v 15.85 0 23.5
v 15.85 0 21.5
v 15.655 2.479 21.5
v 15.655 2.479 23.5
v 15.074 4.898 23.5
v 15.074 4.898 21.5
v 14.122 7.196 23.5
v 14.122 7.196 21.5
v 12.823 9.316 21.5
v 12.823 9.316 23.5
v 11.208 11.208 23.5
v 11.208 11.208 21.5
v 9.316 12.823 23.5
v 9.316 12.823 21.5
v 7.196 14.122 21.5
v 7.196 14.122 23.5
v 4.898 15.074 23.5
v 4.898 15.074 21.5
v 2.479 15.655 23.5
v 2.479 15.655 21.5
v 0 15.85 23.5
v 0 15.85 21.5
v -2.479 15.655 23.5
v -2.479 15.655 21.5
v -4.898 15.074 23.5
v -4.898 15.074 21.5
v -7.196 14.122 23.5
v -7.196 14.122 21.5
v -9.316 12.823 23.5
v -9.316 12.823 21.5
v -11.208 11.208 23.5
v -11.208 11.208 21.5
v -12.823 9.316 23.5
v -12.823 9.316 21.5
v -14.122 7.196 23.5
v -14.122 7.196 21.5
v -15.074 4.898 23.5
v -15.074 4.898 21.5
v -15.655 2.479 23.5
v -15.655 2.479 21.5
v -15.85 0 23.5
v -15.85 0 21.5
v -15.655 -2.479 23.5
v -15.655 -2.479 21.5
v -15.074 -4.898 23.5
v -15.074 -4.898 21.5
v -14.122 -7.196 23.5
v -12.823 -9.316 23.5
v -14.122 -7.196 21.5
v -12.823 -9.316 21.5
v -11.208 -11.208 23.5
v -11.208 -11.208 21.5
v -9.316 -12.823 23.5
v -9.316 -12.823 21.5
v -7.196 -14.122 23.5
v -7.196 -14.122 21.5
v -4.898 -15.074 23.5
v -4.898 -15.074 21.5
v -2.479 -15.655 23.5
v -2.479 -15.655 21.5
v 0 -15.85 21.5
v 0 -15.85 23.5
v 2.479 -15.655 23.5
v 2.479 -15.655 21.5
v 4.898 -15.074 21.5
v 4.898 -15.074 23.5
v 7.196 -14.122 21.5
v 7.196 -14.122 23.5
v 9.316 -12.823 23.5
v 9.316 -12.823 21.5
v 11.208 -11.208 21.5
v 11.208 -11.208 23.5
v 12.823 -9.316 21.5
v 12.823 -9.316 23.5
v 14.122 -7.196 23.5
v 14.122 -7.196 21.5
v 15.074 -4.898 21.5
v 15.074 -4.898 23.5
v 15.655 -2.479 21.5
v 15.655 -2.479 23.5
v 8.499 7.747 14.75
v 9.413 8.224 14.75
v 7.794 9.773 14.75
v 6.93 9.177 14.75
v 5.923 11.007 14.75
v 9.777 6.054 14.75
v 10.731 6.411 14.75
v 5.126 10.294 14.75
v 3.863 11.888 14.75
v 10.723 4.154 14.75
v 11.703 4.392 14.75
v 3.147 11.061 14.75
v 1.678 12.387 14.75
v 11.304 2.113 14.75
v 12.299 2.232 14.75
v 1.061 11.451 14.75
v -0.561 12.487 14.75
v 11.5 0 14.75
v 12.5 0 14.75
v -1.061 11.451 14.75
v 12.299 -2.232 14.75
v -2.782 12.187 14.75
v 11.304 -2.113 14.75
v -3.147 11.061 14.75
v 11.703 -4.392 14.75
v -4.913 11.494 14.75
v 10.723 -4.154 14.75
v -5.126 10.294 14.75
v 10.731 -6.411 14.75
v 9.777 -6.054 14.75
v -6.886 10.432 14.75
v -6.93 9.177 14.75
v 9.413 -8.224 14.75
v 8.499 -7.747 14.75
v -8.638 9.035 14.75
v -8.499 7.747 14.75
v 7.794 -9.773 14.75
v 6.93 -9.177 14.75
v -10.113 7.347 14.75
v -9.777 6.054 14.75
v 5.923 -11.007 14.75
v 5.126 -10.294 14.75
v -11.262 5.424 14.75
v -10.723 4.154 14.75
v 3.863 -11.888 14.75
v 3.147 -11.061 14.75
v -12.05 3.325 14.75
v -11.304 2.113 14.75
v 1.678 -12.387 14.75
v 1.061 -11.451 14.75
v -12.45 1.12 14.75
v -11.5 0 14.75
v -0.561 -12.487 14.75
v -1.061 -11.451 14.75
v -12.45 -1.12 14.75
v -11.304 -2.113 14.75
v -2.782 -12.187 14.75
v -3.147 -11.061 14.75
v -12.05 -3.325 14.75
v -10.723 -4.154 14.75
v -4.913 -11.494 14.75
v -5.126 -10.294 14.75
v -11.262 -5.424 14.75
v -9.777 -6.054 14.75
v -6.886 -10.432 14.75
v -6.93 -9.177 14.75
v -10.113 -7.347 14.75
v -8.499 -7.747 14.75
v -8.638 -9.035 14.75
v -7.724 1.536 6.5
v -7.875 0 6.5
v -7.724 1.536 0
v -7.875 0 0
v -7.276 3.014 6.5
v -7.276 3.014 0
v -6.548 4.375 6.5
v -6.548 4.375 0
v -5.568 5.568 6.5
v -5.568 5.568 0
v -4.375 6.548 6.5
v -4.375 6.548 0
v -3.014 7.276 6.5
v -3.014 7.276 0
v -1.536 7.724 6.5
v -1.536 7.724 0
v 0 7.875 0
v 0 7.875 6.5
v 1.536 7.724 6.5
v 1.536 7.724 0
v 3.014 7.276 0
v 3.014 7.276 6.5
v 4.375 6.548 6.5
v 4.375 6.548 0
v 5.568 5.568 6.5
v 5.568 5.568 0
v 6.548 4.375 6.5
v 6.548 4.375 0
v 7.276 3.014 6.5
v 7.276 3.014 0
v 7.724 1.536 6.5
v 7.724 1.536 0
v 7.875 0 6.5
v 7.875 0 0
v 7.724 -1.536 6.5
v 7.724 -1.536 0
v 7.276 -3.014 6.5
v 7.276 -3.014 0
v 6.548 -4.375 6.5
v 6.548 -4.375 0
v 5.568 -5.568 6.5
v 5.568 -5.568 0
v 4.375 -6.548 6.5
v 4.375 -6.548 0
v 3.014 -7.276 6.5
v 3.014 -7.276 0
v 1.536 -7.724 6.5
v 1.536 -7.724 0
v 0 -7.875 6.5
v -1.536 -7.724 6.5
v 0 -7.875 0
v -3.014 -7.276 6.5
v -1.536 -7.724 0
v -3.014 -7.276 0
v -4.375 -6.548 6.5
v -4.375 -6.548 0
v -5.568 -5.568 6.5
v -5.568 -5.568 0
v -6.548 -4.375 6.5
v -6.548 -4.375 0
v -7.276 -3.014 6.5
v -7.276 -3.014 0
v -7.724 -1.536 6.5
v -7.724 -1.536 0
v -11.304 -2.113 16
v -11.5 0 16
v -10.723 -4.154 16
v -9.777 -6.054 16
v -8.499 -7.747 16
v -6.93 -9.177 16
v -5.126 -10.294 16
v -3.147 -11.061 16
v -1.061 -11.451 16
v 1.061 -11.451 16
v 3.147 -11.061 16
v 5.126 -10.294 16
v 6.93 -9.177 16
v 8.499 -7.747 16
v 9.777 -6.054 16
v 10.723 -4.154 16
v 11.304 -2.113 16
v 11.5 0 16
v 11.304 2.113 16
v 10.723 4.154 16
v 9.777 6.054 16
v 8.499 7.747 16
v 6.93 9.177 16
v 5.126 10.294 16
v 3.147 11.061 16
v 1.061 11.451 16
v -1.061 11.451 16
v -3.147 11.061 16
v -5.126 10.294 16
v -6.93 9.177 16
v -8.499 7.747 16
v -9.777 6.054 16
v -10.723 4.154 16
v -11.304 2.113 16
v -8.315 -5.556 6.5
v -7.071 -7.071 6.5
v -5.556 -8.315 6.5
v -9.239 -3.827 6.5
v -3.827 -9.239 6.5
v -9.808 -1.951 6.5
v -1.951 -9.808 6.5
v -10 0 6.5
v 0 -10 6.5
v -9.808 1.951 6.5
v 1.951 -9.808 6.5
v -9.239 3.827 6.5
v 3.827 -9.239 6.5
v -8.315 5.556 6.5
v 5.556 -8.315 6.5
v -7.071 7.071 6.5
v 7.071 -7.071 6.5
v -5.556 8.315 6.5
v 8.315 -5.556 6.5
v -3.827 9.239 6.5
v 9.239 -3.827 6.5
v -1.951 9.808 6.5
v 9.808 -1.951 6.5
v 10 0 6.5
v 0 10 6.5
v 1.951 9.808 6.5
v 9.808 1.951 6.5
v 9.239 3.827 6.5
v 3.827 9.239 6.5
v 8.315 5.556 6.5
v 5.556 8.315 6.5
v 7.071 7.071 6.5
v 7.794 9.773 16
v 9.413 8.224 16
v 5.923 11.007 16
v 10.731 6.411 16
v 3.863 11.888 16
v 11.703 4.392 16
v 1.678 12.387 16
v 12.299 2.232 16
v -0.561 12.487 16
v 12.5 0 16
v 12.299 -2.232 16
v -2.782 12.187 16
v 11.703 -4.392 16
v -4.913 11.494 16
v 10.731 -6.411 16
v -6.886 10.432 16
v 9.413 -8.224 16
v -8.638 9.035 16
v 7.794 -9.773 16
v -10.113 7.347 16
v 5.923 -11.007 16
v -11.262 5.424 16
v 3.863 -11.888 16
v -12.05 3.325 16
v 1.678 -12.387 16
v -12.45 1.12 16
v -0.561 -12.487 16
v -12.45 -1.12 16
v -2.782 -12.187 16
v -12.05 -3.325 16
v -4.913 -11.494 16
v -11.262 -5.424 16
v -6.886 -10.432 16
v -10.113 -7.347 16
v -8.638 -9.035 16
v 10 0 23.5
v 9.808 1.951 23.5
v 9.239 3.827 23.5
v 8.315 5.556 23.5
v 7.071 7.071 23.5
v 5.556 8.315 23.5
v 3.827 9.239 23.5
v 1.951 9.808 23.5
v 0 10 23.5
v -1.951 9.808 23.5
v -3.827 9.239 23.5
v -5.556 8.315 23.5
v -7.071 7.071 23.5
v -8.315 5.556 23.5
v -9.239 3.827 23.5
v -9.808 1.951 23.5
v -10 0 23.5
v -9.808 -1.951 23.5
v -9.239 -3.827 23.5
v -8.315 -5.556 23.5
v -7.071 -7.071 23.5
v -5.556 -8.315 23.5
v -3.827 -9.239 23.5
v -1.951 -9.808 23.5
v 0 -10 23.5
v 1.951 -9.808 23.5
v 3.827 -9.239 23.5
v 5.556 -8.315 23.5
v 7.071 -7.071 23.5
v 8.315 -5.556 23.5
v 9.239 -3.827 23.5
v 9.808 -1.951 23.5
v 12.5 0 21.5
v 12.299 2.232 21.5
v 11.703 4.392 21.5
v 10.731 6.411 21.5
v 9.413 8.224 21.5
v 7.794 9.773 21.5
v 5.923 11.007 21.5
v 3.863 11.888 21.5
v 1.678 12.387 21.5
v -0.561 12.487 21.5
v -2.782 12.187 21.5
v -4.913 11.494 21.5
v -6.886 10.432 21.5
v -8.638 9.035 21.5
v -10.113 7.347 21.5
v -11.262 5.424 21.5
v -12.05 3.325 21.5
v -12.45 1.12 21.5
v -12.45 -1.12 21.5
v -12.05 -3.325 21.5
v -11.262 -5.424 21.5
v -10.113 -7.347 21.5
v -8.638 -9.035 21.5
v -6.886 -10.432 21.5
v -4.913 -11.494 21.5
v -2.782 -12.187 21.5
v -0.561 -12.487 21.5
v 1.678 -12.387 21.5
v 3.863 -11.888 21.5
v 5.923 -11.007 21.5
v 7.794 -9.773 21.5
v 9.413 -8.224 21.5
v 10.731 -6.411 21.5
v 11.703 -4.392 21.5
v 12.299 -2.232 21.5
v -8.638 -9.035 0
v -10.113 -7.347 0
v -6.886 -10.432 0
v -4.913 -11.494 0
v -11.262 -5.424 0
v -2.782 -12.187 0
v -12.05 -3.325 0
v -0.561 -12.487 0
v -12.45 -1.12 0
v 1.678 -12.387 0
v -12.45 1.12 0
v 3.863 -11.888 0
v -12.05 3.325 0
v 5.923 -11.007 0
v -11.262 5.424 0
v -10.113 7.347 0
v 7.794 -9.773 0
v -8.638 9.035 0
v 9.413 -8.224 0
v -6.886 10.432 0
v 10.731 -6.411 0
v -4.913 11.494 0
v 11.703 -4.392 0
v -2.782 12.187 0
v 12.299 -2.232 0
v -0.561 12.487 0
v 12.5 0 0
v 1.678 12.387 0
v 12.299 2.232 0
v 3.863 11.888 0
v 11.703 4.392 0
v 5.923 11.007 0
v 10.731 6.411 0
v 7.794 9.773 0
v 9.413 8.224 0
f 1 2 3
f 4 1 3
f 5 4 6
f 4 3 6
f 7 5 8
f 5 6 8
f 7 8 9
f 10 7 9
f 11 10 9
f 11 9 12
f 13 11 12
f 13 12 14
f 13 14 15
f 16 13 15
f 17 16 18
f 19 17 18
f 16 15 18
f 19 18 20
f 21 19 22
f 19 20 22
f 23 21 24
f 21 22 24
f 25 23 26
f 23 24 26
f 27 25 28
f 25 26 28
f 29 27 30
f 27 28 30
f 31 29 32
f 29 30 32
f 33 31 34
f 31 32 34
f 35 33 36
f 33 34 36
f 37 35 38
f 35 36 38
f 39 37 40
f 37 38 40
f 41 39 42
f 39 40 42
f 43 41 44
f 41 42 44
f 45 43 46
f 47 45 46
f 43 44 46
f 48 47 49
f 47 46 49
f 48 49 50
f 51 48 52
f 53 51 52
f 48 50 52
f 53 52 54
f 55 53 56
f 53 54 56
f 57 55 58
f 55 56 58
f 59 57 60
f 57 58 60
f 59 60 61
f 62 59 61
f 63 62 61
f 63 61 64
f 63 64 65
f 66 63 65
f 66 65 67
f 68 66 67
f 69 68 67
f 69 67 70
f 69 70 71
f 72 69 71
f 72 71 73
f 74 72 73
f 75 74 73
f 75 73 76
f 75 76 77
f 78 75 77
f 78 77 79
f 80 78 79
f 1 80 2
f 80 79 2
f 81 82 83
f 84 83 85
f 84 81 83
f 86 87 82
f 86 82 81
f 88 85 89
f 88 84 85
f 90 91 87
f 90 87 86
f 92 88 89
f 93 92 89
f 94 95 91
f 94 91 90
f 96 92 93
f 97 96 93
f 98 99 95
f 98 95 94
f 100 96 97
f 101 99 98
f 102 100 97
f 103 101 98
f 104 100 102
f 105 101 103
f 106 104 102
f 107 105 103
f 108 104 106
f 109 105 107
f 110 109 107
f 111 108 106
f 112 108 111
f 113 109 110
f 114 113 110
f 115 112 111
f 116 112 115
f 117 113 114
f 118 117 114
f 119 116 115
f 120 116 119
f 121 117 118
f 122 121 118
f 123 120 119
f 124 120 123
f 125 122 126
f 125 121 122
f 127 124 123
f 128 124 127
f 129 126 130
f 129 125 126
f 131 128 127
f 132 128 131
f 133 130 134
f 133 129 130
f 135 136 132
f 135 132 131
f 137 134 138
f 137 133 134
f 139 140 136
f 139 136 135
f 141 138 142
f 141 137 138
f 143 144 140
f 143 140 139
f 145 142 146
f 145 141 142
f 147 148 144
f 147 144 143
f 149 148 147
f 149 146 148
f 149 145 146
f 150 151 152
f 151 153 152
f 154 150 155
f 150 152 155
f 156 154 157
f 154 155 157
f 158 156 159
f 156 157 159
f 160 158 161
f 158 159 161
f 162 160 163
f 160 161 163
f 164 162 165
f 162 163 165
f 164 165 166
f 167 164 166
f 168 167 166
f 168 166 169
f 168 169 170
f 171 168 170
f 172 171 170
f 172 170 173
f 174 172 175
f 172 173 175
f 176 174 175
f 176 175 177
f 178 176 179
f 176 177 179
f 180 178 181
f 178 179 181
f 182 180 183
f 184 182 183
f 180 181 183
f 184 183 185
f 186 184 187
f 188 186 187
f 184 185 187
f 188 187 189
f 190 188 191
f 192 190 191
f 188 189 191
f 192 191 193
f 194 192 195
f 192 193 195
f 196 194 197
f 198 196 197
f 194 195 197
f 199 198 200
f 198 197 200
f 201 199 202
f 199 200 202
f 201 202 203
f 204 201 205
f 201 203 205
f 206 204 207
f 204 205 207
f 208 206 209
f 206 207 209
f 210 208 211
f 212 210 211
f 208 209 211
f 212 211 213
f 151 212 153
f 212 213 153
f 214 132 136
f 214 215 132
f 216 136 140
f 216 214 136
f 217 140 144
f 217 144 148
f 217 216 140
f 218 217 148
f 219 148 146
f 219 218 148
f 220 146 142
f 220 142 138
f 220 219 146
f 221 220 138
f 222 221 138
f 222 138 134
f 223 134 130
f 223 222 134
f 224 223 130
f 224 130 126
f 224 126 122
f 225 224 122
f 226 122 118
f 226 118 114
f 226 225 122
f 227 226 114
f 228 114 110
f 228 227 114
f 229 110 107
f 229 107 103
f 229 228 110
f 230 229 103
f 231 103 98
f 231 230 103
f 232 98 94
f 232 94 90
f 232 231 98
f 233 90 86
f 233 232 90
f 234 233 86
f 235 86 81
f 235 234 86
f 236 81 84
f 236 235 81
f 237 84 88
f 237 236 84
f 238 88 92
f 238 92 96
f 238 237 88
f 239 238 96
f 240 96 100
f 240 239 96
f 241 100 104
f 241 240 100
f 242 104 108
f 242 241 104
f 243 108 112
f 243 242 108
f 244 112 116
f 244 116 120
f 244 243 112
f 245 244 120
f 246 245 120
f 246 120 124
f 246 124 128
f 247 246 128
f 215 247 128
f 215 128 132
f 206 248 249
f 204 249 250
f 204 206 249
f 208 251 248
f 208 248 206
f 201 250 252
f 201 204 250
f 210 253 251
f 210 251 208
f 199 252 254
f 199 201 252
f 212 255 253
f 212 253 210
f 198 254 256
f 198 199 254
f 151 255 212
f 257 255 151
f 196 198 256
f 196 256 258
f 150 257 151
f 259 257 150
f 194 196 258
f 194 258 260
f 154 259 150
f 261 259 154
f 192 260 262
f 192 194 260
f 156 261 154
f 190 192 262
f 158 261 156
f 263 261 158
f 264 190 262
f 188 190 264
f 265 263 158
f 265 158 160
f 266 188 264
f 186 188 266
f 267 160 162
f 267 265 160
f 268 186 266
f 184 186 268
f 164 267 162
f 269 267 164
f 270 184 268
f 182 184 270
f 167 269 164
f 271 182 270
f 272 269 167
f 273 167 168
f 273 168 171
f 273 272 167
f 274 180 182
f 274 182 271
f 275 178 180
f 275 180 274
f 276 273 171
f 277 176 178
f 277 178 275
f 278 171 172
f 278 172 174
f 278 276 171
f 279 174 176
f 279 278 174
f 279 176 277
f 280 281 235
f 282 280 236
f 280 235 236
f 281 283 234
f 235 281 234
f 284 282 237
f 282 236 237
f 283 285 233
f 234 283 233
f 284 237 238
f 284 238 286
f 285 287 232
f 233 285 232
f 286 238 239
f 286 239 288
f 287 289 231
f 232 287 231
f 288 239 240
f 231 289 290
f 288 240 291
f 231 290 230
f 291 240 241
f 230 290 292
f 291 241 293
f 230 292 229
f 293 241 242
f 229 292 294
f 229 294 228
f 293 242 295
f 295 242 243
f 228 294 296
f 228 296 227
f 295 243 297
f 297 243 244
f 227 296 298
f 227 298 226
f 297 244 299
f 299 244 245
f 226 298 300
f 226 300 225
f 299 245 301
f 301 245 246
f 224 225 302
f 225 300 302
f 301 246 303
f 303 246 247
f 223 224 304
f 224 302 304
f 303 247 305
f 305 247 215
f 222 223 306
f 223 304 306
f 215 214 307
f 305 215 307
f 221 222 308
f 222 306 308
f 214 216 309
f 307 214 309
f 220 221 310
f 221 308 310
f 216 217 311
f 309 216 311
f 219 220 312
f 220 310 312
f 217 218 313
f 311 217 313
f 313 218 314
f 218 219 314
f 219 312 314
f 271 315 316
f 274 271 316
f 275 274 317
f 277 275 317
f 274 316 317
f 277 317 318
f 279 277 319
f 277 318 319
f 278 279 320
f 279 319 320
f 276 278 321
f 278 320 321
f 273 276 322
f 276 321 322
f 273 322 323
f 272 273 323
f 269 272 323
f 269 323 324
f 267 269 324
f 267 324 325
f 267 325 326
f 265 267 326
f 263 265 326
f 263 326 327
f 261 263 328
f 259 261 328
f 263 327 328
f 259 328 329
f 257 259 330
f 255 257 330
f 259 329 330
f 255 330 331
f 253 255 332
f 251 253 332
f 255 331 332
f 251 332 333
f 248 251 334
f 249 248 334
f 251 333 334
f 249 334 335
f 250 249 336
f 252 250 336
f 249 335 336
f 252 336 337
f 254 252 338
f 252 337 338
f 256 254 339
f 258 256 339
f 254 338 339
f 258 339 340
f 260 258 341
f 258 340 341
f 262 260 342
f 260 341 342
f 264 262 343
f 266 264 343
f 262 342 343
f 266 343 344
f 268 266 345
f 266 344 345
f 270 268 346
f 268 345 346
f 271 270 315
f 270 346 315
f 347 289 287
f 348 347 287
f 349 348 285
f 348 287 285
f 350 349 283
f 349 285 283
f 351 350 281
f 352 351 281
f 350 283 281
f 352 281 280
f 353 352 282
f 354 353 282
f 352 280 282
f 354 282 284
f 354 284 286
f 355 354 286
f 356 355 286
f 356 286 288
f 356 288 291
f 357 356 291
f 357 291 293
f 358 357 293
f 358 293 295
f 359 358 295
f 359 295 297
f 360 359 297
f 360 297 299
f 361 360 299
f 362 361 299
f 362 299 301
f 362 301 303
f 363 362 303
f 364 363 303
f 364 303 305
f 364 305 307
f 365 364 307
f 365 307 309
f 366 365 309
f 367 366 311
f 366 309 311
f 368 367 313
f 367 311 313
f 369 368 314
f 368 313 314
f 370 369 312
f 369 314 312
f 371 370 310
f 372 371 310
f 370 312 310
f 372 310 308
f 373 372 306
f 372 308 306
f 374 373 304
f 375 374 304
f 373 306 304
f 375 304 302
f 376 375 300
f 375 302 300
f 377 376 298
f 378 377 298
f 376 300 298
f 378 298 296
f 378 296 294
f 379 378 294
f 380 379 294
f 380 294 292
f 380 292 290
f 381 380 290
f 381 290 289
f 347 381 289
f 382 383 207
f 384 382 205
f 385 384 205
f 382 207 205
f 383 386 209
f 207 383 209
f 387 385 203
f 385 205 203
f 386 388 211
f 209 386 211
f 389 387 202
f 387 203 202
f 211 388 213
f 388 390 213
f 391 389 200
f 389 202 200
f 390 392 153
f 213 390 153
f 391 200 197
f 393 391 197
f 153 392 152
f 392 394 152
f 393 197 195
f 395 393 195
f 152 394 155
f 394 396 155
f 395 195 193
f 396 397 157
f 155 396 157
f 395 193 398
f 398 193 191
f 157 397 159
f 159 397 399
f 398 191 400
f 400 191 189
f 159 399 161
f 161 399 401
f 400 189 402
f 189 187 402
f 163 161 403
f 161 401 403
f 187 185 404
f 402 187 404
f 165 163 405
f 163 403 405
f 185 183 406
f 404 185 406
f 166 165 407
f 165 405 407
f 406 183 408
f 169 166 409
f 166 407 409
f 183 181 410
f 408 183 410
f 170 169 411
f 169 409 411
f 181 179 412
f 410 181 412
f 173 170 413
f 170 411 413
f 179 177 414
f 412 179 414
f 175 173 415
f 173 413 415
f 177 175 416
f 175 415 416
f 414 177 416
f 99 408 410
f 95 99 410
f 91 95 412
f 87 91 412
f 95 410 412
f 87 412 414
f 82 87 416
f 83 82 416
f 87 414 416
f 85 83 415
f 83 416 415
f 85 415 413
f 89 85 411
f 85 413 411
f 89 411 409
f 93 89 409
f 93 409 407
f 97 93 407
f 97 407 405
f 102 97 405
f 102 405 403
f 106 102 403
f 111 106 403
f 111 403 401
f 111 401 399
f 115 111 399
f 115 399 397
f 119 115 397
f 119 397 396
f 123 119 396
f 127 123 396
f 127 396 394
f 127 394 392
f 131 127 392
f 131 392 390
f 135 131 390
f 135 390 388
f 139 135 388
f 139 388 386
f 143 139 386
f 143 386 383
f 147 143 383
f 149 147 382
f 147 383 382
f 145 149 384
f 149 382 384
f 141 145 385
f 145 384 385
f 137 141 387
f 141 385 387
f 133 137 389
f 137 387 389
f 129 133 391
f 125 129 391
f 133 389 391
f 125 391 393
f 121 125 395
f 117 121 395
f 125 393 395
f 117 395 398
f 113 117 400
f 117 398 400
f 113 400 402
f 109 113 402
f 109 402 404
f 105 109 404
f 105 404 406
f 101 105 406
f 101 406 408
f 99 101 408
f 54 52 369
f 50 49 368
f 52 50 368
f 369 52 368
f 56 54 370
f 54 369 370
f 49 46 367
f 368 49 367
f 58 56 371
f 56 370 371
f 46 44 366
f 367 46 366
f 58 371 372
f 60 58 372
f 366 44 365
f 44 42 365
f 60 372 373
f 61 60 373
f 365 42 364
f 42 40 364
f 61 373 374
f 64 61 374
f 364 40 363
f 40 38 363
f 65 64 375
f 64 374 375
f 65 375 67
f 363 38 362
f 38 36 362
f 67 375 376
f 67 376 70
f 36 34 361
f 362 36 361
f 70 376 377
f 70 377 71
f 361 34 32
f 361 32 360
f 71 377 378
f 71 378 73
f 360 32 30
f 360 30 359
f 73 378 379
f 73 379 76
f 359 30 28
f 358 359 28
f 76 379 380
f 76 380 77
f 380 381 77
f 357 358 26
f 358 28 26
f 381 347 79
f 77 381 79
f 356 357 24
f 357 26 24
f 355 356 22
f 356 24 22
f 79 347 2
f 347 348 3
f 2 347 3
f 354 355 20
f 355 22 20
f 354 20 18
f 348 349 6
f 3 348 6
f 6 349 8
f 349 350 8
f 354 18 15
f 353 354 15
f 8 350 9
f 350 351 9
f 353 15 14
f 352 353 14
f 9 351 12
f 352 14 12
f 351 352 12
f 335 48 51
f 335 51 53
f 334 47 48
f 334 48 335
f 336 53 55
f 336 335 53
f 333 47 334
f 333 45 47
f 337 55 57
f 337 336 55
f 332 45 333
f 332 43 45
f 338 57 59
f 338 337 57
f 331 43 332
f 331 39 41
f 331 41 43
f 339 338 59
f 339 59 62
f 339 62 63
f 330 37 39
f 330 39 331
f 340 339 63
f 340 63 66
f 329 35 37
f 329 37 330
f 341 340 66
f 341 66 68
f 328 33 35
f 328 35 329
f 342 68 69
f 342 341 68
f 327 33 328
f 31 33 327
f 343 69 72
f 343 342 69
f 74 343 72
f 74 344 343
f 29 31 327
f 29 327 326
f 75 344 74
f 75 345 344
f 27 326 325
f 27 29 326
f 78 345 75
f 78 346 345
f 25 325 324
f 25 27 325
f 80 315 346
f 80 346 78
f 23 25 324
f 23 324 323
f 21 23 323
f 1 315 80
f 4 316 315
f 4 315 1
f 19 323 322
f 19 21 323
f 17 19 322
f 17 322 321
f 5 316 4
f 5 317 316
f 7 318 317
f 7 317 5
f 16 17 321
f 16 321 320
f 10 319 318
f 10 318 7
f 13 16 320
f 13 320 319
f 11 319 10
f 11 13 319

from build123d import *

# Parameters (mm, degrees)
F0_R     = 12.5
F1_DEPTH = 21.5
F2_R     = 15.85
F2_R_2   = 12.5
F3_DEPTH = 2
F5_D     = 15.75
F5_DEPTH = 23.5
F5_TIP   = 4.7317773748
F6_R     = 10
F7_DEPTH = 17
F8_W     = 1
F8_H     = 1.25


with BuildPart() as f1:
    # F0 (on Top) → F1 (new body)
    with BuildSketch(Plane.XY):
        Circle(F0_R)
    extrude(amount=F1_DEPTH)

    # F2 (on face) → F3 (join)
    with BuildSketch(Plane.XY.offset(21.5)):
        Circle(F2_R)
        Circle(F2_R_2, mode=Mode.SUBTRACT)
        Circle(F2_R_2)
    extrude(amount=F3_DEPTH)

    # F5
    with Locations(Plane.XY.offset(23.5)):
        with Locations((0, 0)):
            Hole(F5_D / 2, depth=F5_DEPTH)
            with Locations((0, 0, -(F5_DEPTH + F5_TIP / 2))):  # 118° drill point
                Cone(0, F5_D / 2, F5_TIP, mode=Mode.SUBTRACT)

    # F6 (on face) → F7 (cut)
    with BuildSketch(Plane.XY.offset(23.5)):
        Circle(F6_R)
    extrude(amount=-F7_DEPTH, mode=Mode.SUBTRACT)

    # F8 (on Front) → F9 (revolve, cut)
    with BuildSketch(Plane.XZ):
        with Locations((-12, 15.375)):
            Rectangle(F8_W, F8_H)
    revolve(axis=Axis((0, 0, 8), (0, 0, 1)), mode=Mode.SUBTRACT)


solid = f1.part
